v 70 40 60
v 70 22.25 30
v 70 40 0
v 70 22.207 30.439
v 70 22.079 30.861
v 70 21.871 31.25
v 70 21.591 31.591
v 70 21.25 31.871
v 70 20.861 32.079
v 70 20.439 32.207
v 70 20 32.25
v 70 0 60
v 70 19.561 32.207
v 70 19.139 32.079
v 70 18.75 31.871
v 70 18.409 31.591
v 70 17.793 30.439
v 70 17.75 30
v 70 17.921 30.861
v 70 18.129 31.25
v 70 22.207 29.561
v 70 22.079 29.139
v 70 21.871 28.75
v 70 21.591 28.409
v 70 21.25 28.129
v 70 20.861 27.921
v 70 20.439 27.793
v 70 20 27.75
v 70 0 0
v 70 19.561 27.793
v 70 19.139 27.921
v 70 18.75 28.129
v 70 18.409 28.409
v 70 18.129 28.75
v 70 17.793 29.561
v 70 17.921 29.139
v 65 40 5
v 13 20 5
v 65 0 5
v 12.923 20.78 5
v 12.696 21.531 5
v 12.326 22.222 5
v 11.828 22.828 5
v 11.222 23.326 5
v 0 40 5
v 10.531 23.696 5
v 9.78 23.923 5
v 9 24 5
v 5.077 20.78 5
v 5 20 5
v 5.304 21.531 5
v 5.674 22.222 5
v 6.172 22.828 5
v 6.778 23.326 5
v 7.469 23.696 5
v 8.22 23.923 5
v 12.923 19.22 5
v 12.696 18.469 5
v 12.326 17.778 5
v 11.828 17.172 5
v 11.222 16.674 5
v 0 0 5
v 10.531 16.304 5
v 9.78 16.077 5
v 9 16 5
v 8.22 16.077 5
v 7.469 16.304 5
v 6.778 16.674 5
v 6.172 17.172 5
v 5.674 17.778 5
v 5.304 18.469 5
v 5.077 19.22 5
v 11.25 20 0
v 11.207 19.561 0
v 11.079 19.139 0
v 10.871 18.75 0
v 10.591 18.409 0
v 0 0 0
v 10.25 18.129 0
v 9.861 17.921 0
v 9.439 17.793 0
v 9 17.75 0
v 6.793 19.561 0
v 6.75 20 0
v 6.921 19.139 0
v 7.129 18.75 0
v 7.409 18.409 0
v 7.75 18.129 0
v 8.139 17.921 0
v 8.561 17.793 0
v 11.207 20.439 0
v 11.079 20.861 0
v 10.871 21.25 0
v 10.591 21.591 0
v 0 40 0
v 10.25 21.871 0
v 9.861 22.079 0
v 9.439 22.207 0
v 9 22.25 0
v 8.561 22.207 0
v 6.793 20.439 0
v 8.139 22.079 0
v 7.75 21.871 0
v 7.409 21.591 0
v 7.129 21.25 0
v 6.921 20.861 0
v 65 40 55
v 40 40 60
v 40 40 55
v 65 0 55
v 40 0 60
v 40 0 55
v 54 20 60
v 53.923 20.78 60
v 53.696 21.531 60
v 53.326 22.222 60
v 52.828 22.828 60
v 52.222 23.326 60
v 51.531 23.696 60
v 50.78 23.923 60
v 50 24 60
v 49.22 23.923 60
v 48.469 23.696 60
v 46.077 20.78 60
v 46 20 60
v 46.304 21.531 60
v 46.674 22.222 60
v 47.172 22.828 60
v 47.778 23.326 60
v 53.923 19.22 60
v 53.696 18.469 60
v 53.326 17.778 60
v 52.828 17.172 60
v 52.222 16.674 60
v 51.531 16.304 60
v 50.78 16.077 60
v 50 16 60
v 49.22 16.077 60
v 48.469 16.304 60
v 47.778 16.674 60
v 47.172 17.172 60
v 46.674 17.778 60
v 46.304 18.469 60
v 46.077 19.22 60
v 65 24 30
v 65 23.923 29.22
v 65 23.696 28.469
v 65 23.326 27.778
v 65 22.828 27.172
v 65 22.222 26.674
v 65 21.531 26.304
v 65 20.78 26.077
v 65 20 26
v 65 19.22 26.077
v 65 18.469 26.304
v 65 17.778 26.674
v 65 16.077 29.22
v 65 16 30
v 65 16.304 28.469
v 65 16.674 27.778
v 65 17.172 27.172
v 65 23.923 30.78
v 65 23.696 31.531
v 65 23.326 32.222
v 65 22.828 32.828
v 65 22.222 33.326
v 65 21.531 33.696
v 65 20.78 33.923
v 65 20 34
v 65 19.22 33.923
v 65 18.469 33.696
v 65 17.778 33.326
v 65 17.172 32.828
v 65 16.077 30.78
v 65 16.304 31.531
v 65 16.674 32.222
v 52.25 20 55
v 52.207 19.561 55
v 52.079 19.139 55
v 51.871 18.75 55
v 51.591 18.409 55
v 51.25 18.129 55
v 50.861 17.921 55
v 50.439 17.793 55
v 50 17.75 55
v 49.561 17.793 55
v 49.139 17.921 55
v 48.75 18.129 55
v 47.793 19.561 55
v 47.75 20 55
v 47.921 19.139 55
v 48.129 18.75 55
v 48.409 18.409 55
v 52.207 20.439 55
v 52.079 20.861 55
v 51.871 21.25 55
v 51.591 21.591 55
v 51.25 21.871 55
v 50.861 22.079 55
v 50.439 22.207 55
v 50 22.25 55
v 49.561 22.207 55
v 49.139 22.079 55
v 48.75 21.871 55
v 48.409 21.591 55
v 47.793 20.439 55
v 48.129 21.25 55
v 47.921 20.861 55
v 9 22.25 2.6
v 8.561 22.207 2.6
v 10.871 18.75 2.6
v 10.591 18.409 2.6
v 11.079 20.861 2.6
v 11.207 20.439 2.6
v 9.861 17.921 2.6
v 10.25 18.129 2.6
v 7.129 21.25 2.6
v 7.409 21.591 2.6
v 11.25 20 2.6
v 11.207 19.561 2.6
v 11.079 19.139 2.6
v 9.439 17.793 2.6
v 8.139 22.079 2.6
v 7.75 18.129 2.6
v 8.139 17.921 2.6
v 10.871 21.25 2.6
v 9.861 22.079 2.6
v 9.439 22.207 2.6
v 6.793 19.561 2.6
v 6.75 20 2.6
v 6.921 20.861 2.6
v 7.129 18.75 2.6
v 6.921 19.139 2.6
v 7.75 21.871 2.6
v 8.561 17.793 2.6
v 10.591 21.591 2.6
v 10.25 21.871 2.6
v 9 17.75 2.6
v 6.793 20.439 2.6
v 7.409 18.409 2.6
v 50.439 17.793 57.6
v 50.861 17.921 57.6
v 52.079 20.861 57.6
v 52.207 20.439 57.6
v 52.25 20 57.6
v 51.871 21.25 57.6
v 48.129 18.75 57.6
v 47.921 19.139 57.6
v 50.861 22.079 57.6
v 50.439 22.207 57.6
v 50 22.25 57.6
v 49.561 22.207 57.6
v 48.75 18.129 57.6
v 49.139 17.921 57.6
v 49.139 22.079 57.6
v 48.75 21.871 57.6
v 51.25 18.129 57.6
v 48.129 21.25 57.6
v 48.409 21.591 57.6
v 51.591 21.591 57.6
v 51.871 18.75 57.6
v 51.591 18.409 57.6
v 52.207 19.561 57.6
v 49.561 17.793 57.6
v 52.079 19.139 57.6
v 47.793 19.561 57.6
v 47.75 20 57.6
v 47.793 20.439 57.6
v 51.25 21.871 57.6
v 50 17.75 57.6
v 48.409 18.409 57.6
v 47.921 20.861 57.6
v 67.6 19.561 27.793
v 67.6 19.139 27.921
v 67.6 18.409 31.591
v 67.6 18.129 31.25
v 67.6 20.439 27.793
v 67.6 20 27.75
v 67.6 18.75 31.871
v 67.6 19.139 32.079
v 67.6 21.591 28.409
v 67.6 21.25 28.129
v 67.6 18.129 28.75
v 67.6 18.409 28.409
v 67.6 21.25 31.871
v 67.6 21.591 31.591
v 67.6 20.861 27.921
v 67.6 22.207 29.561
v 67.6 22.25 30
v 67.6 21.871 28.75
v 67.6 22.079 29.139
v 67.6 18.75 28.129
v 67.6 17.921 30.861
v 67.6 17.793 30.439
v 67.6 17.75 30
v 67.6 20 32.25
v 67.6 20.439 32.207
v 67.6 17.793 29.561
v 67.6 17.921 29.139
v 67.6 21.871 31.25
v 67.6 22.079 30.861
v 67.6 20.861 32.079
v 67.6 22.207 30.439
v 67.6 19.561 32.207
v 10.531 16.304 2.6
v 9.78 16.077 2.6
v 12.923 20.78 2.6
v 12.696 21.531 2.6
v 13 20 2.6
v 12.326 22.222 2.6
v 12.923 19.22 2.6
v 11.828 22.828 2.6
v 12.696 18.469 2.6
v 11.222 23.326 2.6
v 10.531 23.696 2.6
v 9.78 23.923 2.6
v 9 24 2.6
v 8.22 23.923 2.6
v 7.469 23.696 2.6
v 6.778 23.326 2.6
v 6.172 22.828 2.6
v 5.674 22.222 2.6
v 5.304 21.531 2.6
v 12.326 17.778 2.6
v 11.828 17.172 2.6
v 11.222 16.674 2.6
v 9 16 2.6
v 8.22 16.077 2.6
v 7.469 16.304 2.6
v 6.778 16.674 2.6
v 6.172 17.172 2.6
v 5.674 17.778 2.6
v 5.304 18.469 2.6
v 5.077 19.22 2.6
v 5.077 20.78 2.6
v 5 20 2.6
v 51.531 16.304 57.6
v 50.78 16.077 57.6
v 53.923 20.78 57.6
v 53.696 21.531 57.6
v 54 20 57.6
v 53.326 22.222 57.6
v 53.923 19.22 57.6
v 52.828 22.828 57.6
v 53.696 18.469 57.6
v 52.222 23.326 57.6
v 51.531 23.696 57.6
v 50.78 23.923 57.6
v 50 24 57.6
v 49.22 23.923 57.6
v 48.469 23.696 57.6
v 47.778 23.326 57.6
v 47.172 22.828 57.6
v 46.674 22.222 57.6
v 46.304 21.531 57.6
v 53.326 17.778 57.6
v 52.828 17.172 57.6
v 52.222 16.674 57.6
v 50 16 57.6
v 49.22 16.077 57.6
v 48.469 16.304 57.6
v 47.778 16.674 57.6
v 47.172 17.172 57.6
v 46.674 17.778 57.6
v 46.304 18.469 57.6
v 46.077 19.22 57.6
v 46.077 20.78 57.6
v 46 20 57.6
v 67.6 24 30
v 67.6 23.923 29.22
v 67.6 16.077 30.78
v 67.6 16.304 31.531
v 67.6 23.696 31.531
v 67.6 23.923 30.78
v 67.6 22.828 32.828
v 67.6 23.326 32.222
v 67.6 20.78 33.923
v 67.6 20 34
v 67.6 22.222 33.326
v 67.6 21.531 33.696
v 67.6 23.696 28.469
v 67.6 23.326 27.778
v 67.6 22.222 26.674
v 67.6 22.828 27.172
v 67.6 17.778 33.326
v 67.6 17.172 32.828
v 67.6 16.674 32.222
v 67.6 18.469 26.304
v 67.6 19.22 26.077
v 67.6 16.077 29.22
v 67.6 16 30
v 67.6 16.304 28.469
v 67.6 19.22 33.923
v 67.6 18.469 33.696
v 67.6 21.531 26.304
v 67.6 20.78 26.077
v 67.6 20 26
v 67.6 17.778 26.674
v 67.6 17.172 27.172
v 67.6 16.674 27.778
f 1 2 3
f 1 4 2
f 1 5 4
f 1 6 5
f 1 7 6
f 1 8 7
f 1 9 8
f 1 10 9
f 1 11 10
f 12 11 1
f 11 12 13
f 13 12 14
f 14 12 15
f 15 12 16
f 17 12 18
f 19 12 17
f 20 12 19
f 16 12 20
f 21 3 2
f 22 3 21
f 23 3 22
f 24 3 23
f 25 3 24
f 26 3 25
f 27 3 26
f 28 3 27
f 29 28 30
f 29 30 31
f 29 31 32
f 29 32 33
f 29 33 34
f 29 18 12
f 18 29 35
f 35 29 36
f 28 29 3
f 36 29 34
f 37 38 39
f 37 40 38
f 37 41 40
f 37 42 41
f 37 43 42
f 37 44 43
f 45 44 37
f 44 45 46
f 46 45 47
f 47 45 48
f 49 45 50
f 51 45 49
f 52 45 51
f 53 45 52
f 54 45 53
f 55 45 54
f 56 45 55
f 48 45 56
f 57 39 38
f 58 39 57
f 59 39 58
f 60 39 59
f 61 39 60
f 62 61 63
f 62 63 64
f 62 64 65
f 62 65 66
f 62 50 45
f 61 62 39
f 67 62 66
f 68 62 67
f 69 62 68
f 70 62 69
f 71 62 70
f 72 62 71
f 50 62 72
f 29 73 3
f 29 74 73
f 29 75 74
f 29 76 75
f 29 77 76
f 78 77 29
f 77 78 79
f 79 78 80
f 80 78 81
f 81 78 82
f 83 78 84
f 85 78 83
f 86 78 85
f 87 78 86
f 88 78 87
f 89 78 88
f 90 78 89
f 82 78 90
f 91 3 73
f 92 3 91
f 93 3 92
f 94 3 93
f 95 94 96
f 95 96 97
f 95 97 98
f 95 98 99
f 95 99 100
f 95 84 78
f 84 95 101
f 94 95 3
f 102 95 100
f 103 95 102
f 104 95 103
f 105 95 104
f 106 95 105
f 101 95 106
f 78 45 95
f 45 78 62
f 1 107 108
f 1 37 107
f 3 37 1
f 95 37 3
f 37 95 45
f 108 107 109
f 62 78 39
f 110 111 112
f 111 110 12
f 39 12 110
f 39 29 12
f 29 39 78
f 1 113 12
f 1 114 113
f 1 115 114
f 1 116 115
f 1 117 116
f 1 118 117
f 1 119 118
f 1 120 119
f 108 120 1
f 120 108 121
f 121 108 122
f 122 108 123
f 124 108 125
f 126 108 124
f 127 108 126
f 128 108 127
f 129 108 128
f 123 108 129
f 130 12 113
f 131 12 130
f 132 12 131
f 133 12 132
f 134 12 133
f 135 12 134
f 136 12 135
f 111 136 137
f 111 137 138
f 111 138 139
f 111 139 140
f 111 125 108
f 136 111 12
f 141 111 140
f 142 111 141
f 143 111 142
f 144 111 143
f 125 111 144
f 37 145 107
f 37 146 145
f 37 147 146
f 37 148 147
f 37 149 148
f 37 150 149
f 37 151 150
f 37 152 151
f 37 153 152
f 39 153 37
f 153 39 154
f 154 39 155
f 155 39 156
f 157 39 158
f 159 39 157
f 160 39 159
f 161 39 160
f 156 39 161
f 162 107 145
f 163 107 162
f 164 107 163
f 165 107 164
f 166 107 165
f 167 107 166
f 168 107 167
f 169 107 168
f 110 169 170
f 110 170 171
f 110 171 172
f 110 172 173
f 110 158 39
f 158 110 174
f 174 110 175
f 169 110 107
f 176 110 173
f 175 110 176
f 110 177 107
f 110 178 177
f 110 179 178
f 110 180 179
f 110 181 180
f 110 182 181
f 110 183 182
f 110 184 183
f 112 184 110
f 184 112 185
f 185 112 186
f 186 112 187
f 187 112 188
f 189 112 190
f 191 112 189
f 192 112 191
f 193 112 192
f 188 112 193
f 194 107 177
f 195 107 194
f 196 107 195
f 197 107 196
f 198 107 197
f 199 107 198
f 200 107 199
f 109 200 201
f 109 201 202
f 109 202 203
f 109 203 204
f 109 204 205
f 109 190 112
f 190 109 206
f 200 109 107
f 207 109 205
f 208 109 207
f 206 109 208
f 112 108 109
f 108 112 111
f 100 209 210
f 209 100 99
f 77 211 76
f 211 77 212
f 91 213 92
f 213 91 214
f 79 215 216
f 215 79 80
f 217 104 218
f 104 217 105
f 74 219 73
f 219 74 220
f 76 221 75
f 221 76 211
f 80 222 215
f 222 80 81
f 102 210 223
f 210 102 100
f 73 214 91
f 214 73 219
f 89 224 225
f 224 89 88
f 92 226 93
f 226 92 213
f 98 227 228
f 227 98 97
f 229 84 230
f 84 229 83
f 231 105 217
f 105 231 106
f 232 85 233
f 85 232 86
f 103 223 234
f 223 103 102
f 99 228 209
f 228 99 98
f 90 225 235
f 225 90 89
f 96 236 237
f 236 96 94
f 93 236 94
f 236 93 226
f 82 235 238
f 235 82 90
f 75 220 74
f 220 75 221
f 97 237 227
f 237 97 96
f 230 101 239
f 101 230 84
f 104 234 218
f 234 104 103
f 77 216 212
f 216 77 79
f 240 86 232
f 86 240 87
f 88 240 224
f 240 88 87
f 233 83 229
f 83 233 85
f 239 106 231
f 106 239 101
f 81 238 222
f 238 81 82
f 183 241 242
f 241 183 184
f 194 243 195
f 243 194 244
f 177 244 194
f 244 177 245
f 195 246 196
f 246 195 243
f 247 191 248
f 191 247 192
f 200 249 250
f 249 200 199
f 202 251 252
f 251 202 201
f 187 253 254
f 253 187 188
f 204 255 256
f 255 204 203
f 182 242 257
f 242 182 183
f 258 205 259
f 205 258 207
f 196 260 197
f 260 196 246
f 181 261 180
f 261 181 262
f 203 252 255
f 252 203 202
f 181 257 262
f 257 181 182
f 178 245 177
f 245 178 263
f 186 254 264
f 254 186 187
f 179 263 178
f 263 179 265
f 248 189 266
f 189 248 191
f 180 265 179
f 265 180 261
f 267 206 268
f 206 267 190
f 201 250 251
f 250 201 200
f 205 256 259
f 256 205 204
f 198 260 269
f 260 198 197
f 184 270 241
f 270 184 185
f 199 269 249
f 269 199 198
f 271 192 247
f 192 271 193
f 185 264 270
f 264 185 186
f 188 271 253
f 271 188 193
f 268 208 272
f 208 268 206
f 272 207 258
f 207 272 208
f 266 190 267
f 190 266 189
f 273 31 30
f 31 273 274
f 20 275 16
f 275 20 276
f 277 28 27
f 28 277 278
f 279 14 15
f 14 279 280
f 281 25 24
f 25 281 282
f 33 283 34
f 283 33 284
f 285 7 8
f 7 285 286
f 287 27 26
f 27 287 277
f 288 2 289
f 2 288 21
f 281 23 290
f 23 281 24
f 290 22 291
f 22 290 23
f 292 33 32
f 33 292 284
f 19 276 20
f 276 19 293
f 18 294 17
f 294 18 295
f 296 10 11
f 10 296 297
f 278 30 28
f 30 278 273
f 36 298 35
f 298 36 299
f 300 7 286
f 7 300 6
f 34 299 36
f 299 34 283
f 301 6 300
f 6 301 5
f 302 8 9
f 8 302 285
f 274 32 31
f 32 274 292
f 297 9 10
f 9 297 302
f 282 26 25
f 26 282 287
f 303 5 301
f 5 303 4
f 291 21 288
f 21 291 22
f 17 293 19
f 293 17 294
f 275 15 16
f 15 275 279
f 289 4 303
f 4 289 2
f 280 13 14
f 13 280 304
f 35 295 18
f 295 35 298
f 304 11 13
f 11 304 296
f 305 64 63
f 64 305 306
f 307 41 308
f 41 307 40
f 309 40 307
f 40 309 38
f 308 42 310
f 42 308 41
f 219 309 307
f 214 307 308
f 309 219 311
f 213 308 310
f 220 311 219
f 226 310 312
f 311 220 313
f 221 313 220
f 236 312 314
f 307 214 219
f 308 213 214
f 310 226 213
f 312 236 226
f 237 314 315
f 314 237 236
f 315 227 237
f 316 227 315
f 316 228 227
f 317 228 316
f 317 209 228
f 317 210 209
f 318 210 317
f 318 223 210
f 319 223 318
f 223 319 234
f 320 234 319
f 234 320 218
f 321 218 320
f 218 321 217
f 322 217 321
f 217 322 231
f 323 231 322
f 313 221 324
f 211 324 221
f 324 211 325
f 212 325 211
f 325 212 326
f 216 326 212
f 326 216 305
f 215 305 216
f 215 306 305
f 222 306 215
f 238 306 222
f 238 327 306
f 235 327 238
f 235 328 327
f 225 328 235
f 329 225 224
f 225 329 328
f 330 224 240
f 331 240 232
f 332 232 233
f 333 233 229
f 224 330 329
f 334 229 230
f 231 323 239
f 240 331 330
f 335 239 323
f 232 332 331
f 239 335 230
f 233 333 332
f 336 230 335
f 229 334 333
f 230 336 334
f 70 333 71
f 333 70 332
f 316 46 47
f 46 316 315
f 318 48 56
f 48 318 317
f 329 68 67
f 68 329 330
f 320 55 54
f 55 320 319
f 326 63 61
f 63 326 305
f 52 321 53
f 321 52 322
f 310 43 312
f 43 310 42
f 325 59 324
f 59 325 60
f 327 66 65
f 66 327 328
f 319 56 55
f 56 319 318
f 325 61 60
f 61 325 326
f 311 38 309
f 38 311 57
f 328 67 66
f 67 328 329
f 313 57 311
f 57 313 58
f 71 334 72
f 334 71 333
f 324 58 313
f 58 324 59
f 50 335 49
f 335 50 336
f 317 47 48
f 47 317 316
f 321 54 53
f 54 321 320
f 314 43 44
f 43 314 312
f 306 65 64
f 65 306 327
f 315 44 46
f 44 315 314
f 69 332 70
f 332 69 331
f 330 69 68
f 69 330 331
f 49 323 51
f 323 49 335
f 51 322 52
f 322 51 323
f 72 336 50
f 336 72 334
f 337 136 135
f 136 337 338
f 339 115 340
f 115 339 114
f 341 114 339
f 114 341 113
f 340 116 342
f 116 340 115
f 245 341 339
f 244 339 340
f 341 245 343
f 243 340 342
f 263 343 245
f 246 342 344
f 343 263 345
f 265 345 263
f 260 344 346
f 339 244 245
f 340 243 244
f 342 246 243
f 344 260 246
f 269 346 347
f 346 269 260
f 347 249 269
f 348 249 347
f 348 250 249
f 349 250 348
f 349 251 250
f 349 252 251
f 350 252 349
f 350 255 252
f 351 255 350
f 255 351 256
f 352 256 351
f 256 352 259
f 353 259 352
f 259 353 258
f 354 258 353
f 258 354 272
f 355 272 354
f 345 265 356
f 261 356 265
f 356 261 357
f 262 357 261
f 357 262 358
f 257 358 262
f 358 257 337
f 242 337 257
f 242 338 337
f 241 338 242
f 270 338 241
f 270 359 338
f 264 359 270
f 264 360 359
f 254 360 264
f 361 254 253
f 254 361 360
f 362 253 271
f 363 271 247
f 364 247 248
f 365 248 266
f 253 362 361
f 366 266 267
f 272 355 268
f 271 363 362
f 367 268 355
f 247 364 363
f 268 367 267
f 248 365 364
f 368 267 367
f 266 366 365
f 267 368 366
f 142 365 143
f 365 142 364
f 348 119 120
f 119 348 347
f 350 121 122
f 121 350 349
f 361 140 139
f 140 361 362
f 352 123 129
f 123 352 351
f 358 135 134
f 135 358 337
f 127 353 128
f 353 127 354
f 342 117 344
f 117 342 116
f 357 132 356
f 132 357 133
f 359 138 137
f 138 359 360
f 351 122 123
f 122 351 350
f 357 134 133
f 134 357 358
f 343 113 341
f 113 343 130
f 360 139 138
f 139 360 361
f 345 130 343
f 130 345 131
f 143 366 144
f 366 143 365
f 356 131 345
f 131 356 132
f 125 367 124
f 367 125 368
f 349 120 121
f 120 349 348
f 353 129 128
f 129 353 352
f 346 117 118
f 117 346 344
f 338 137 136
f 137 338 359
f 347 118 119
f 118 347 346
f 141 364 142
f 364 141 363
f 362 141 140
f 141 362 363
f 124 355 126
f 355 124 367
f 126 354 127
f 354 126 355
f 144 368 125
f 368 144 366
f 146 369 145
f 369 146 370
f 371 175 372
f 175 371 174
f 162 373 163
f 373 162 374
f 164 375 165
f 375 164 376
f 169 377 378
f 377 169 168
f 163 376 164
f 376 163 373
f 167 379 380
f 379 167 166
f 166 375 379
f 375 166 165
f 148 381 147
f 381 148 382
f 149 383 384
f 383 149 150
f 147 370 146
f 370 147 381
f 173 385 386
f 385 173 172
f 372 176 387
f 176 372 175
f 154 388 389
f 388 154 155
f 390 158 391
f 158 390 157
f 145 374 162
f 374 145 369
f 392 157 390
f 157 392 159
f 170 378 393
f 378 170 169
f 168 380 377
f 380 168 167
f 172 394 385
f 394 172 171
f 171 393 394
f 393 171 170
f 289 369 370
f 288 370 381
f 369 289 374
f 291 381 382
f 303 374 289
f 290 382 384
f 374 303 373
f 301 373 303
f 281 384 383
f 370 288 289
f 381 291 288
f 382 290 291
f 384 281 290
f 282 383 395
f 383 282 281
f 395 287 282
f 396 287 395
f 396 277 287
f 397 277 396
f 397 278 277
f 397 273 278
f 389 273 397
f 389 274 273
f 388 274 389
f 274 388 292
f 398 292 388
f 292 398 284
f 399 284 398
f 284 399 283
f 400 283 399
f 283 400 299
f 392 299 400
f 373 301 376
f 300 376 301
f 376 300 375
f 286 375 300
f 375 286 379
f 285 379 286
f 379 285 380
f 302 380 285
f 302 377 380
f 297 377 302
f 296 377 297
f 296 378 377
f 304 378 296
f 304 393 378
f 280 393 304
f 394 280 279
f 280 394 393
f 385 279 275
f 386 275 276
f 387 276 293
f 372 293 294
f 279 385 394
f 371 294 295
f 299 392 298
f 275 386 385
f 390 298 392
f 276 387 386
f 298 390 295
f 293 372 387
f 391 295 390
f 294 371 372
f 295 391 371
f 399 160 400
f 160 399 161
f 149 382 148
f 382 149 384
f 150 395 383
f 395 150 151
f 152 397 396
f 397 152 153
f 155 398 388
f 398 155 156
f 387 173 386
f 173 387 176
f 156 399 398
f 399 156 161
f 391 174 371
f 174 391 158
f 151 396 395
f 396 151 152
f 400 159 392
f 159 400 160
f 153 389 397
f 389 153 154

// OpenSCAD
$fn = 32;

// ----------------------------------------------------------------------
// Z-bracket: 70 x 40 x 60 mm
// ----------------------------------------------------------------------

// --- parameters (mm) ---
foot_len = 70;            // lower foot length, X
top_len = 25;             // upper foot length, X
depth = 40;               // bracket width, Y
step_h = 60;              // overall rise, Z
plate_t = 5;              // plate thickness
hole_d = 4.5;             // clearance for M4
cb_d = 8;                 // counterbore diameter
cb_h = 2.4;               // counterbore depth

module hole_z(px, py, z0) {
  translate([px, py, z0 - 2.5]) cylinder(h = plate_t + 5, d = hole_d);
}
module hole_x(py, pz) {
  translate([-2.5, py, pz]) rotate([0, 90, 0]) cylinder(h = plate_t + 5, d = hole_d);
}
module cb_z(px, py, top_z) {
  translate([px, py, top_z - cb_h]) cylinder(h = cb_h + 0.5, d = cb_d);
}
module cb_x(py, pz) {
  translate([plate_t - cb_h, py, pz]) rotate([0, -90, 0]) cylinder(h = cb_h + 0.5, d = cb_d);
}

difference() {
  union() {
    cube([foot_len, depth, plate_t]);
    /* web, overlapping the lower foot */
    translate([foot_len - plate_t, 0, 0]) cube([plate_t, depth, step_h]);
    /* upper foot, sunk into the web */
    translate([foot_len - plate_t - top_len, 0, step_h - plate_t]) cube([top_len + plate_t, depth, plate_t]);
  }
  hole_z(9, 20, 0);
  translate([foot_len - plate_t - 15, 0, 0]) hole_z(0, 20, step_h - plate_t);
  translate([foot_len - plate_t, 0, 0]) hole_x(20, 30);
  cb_z(9, 20, plate_t);
  translate([foot_len - plate_t - 15, 0, 0]) cb_z(0, 20, step_h);
  translate([foot_len - plate_t, 0, 0]) cb_x(20, 30);
}
